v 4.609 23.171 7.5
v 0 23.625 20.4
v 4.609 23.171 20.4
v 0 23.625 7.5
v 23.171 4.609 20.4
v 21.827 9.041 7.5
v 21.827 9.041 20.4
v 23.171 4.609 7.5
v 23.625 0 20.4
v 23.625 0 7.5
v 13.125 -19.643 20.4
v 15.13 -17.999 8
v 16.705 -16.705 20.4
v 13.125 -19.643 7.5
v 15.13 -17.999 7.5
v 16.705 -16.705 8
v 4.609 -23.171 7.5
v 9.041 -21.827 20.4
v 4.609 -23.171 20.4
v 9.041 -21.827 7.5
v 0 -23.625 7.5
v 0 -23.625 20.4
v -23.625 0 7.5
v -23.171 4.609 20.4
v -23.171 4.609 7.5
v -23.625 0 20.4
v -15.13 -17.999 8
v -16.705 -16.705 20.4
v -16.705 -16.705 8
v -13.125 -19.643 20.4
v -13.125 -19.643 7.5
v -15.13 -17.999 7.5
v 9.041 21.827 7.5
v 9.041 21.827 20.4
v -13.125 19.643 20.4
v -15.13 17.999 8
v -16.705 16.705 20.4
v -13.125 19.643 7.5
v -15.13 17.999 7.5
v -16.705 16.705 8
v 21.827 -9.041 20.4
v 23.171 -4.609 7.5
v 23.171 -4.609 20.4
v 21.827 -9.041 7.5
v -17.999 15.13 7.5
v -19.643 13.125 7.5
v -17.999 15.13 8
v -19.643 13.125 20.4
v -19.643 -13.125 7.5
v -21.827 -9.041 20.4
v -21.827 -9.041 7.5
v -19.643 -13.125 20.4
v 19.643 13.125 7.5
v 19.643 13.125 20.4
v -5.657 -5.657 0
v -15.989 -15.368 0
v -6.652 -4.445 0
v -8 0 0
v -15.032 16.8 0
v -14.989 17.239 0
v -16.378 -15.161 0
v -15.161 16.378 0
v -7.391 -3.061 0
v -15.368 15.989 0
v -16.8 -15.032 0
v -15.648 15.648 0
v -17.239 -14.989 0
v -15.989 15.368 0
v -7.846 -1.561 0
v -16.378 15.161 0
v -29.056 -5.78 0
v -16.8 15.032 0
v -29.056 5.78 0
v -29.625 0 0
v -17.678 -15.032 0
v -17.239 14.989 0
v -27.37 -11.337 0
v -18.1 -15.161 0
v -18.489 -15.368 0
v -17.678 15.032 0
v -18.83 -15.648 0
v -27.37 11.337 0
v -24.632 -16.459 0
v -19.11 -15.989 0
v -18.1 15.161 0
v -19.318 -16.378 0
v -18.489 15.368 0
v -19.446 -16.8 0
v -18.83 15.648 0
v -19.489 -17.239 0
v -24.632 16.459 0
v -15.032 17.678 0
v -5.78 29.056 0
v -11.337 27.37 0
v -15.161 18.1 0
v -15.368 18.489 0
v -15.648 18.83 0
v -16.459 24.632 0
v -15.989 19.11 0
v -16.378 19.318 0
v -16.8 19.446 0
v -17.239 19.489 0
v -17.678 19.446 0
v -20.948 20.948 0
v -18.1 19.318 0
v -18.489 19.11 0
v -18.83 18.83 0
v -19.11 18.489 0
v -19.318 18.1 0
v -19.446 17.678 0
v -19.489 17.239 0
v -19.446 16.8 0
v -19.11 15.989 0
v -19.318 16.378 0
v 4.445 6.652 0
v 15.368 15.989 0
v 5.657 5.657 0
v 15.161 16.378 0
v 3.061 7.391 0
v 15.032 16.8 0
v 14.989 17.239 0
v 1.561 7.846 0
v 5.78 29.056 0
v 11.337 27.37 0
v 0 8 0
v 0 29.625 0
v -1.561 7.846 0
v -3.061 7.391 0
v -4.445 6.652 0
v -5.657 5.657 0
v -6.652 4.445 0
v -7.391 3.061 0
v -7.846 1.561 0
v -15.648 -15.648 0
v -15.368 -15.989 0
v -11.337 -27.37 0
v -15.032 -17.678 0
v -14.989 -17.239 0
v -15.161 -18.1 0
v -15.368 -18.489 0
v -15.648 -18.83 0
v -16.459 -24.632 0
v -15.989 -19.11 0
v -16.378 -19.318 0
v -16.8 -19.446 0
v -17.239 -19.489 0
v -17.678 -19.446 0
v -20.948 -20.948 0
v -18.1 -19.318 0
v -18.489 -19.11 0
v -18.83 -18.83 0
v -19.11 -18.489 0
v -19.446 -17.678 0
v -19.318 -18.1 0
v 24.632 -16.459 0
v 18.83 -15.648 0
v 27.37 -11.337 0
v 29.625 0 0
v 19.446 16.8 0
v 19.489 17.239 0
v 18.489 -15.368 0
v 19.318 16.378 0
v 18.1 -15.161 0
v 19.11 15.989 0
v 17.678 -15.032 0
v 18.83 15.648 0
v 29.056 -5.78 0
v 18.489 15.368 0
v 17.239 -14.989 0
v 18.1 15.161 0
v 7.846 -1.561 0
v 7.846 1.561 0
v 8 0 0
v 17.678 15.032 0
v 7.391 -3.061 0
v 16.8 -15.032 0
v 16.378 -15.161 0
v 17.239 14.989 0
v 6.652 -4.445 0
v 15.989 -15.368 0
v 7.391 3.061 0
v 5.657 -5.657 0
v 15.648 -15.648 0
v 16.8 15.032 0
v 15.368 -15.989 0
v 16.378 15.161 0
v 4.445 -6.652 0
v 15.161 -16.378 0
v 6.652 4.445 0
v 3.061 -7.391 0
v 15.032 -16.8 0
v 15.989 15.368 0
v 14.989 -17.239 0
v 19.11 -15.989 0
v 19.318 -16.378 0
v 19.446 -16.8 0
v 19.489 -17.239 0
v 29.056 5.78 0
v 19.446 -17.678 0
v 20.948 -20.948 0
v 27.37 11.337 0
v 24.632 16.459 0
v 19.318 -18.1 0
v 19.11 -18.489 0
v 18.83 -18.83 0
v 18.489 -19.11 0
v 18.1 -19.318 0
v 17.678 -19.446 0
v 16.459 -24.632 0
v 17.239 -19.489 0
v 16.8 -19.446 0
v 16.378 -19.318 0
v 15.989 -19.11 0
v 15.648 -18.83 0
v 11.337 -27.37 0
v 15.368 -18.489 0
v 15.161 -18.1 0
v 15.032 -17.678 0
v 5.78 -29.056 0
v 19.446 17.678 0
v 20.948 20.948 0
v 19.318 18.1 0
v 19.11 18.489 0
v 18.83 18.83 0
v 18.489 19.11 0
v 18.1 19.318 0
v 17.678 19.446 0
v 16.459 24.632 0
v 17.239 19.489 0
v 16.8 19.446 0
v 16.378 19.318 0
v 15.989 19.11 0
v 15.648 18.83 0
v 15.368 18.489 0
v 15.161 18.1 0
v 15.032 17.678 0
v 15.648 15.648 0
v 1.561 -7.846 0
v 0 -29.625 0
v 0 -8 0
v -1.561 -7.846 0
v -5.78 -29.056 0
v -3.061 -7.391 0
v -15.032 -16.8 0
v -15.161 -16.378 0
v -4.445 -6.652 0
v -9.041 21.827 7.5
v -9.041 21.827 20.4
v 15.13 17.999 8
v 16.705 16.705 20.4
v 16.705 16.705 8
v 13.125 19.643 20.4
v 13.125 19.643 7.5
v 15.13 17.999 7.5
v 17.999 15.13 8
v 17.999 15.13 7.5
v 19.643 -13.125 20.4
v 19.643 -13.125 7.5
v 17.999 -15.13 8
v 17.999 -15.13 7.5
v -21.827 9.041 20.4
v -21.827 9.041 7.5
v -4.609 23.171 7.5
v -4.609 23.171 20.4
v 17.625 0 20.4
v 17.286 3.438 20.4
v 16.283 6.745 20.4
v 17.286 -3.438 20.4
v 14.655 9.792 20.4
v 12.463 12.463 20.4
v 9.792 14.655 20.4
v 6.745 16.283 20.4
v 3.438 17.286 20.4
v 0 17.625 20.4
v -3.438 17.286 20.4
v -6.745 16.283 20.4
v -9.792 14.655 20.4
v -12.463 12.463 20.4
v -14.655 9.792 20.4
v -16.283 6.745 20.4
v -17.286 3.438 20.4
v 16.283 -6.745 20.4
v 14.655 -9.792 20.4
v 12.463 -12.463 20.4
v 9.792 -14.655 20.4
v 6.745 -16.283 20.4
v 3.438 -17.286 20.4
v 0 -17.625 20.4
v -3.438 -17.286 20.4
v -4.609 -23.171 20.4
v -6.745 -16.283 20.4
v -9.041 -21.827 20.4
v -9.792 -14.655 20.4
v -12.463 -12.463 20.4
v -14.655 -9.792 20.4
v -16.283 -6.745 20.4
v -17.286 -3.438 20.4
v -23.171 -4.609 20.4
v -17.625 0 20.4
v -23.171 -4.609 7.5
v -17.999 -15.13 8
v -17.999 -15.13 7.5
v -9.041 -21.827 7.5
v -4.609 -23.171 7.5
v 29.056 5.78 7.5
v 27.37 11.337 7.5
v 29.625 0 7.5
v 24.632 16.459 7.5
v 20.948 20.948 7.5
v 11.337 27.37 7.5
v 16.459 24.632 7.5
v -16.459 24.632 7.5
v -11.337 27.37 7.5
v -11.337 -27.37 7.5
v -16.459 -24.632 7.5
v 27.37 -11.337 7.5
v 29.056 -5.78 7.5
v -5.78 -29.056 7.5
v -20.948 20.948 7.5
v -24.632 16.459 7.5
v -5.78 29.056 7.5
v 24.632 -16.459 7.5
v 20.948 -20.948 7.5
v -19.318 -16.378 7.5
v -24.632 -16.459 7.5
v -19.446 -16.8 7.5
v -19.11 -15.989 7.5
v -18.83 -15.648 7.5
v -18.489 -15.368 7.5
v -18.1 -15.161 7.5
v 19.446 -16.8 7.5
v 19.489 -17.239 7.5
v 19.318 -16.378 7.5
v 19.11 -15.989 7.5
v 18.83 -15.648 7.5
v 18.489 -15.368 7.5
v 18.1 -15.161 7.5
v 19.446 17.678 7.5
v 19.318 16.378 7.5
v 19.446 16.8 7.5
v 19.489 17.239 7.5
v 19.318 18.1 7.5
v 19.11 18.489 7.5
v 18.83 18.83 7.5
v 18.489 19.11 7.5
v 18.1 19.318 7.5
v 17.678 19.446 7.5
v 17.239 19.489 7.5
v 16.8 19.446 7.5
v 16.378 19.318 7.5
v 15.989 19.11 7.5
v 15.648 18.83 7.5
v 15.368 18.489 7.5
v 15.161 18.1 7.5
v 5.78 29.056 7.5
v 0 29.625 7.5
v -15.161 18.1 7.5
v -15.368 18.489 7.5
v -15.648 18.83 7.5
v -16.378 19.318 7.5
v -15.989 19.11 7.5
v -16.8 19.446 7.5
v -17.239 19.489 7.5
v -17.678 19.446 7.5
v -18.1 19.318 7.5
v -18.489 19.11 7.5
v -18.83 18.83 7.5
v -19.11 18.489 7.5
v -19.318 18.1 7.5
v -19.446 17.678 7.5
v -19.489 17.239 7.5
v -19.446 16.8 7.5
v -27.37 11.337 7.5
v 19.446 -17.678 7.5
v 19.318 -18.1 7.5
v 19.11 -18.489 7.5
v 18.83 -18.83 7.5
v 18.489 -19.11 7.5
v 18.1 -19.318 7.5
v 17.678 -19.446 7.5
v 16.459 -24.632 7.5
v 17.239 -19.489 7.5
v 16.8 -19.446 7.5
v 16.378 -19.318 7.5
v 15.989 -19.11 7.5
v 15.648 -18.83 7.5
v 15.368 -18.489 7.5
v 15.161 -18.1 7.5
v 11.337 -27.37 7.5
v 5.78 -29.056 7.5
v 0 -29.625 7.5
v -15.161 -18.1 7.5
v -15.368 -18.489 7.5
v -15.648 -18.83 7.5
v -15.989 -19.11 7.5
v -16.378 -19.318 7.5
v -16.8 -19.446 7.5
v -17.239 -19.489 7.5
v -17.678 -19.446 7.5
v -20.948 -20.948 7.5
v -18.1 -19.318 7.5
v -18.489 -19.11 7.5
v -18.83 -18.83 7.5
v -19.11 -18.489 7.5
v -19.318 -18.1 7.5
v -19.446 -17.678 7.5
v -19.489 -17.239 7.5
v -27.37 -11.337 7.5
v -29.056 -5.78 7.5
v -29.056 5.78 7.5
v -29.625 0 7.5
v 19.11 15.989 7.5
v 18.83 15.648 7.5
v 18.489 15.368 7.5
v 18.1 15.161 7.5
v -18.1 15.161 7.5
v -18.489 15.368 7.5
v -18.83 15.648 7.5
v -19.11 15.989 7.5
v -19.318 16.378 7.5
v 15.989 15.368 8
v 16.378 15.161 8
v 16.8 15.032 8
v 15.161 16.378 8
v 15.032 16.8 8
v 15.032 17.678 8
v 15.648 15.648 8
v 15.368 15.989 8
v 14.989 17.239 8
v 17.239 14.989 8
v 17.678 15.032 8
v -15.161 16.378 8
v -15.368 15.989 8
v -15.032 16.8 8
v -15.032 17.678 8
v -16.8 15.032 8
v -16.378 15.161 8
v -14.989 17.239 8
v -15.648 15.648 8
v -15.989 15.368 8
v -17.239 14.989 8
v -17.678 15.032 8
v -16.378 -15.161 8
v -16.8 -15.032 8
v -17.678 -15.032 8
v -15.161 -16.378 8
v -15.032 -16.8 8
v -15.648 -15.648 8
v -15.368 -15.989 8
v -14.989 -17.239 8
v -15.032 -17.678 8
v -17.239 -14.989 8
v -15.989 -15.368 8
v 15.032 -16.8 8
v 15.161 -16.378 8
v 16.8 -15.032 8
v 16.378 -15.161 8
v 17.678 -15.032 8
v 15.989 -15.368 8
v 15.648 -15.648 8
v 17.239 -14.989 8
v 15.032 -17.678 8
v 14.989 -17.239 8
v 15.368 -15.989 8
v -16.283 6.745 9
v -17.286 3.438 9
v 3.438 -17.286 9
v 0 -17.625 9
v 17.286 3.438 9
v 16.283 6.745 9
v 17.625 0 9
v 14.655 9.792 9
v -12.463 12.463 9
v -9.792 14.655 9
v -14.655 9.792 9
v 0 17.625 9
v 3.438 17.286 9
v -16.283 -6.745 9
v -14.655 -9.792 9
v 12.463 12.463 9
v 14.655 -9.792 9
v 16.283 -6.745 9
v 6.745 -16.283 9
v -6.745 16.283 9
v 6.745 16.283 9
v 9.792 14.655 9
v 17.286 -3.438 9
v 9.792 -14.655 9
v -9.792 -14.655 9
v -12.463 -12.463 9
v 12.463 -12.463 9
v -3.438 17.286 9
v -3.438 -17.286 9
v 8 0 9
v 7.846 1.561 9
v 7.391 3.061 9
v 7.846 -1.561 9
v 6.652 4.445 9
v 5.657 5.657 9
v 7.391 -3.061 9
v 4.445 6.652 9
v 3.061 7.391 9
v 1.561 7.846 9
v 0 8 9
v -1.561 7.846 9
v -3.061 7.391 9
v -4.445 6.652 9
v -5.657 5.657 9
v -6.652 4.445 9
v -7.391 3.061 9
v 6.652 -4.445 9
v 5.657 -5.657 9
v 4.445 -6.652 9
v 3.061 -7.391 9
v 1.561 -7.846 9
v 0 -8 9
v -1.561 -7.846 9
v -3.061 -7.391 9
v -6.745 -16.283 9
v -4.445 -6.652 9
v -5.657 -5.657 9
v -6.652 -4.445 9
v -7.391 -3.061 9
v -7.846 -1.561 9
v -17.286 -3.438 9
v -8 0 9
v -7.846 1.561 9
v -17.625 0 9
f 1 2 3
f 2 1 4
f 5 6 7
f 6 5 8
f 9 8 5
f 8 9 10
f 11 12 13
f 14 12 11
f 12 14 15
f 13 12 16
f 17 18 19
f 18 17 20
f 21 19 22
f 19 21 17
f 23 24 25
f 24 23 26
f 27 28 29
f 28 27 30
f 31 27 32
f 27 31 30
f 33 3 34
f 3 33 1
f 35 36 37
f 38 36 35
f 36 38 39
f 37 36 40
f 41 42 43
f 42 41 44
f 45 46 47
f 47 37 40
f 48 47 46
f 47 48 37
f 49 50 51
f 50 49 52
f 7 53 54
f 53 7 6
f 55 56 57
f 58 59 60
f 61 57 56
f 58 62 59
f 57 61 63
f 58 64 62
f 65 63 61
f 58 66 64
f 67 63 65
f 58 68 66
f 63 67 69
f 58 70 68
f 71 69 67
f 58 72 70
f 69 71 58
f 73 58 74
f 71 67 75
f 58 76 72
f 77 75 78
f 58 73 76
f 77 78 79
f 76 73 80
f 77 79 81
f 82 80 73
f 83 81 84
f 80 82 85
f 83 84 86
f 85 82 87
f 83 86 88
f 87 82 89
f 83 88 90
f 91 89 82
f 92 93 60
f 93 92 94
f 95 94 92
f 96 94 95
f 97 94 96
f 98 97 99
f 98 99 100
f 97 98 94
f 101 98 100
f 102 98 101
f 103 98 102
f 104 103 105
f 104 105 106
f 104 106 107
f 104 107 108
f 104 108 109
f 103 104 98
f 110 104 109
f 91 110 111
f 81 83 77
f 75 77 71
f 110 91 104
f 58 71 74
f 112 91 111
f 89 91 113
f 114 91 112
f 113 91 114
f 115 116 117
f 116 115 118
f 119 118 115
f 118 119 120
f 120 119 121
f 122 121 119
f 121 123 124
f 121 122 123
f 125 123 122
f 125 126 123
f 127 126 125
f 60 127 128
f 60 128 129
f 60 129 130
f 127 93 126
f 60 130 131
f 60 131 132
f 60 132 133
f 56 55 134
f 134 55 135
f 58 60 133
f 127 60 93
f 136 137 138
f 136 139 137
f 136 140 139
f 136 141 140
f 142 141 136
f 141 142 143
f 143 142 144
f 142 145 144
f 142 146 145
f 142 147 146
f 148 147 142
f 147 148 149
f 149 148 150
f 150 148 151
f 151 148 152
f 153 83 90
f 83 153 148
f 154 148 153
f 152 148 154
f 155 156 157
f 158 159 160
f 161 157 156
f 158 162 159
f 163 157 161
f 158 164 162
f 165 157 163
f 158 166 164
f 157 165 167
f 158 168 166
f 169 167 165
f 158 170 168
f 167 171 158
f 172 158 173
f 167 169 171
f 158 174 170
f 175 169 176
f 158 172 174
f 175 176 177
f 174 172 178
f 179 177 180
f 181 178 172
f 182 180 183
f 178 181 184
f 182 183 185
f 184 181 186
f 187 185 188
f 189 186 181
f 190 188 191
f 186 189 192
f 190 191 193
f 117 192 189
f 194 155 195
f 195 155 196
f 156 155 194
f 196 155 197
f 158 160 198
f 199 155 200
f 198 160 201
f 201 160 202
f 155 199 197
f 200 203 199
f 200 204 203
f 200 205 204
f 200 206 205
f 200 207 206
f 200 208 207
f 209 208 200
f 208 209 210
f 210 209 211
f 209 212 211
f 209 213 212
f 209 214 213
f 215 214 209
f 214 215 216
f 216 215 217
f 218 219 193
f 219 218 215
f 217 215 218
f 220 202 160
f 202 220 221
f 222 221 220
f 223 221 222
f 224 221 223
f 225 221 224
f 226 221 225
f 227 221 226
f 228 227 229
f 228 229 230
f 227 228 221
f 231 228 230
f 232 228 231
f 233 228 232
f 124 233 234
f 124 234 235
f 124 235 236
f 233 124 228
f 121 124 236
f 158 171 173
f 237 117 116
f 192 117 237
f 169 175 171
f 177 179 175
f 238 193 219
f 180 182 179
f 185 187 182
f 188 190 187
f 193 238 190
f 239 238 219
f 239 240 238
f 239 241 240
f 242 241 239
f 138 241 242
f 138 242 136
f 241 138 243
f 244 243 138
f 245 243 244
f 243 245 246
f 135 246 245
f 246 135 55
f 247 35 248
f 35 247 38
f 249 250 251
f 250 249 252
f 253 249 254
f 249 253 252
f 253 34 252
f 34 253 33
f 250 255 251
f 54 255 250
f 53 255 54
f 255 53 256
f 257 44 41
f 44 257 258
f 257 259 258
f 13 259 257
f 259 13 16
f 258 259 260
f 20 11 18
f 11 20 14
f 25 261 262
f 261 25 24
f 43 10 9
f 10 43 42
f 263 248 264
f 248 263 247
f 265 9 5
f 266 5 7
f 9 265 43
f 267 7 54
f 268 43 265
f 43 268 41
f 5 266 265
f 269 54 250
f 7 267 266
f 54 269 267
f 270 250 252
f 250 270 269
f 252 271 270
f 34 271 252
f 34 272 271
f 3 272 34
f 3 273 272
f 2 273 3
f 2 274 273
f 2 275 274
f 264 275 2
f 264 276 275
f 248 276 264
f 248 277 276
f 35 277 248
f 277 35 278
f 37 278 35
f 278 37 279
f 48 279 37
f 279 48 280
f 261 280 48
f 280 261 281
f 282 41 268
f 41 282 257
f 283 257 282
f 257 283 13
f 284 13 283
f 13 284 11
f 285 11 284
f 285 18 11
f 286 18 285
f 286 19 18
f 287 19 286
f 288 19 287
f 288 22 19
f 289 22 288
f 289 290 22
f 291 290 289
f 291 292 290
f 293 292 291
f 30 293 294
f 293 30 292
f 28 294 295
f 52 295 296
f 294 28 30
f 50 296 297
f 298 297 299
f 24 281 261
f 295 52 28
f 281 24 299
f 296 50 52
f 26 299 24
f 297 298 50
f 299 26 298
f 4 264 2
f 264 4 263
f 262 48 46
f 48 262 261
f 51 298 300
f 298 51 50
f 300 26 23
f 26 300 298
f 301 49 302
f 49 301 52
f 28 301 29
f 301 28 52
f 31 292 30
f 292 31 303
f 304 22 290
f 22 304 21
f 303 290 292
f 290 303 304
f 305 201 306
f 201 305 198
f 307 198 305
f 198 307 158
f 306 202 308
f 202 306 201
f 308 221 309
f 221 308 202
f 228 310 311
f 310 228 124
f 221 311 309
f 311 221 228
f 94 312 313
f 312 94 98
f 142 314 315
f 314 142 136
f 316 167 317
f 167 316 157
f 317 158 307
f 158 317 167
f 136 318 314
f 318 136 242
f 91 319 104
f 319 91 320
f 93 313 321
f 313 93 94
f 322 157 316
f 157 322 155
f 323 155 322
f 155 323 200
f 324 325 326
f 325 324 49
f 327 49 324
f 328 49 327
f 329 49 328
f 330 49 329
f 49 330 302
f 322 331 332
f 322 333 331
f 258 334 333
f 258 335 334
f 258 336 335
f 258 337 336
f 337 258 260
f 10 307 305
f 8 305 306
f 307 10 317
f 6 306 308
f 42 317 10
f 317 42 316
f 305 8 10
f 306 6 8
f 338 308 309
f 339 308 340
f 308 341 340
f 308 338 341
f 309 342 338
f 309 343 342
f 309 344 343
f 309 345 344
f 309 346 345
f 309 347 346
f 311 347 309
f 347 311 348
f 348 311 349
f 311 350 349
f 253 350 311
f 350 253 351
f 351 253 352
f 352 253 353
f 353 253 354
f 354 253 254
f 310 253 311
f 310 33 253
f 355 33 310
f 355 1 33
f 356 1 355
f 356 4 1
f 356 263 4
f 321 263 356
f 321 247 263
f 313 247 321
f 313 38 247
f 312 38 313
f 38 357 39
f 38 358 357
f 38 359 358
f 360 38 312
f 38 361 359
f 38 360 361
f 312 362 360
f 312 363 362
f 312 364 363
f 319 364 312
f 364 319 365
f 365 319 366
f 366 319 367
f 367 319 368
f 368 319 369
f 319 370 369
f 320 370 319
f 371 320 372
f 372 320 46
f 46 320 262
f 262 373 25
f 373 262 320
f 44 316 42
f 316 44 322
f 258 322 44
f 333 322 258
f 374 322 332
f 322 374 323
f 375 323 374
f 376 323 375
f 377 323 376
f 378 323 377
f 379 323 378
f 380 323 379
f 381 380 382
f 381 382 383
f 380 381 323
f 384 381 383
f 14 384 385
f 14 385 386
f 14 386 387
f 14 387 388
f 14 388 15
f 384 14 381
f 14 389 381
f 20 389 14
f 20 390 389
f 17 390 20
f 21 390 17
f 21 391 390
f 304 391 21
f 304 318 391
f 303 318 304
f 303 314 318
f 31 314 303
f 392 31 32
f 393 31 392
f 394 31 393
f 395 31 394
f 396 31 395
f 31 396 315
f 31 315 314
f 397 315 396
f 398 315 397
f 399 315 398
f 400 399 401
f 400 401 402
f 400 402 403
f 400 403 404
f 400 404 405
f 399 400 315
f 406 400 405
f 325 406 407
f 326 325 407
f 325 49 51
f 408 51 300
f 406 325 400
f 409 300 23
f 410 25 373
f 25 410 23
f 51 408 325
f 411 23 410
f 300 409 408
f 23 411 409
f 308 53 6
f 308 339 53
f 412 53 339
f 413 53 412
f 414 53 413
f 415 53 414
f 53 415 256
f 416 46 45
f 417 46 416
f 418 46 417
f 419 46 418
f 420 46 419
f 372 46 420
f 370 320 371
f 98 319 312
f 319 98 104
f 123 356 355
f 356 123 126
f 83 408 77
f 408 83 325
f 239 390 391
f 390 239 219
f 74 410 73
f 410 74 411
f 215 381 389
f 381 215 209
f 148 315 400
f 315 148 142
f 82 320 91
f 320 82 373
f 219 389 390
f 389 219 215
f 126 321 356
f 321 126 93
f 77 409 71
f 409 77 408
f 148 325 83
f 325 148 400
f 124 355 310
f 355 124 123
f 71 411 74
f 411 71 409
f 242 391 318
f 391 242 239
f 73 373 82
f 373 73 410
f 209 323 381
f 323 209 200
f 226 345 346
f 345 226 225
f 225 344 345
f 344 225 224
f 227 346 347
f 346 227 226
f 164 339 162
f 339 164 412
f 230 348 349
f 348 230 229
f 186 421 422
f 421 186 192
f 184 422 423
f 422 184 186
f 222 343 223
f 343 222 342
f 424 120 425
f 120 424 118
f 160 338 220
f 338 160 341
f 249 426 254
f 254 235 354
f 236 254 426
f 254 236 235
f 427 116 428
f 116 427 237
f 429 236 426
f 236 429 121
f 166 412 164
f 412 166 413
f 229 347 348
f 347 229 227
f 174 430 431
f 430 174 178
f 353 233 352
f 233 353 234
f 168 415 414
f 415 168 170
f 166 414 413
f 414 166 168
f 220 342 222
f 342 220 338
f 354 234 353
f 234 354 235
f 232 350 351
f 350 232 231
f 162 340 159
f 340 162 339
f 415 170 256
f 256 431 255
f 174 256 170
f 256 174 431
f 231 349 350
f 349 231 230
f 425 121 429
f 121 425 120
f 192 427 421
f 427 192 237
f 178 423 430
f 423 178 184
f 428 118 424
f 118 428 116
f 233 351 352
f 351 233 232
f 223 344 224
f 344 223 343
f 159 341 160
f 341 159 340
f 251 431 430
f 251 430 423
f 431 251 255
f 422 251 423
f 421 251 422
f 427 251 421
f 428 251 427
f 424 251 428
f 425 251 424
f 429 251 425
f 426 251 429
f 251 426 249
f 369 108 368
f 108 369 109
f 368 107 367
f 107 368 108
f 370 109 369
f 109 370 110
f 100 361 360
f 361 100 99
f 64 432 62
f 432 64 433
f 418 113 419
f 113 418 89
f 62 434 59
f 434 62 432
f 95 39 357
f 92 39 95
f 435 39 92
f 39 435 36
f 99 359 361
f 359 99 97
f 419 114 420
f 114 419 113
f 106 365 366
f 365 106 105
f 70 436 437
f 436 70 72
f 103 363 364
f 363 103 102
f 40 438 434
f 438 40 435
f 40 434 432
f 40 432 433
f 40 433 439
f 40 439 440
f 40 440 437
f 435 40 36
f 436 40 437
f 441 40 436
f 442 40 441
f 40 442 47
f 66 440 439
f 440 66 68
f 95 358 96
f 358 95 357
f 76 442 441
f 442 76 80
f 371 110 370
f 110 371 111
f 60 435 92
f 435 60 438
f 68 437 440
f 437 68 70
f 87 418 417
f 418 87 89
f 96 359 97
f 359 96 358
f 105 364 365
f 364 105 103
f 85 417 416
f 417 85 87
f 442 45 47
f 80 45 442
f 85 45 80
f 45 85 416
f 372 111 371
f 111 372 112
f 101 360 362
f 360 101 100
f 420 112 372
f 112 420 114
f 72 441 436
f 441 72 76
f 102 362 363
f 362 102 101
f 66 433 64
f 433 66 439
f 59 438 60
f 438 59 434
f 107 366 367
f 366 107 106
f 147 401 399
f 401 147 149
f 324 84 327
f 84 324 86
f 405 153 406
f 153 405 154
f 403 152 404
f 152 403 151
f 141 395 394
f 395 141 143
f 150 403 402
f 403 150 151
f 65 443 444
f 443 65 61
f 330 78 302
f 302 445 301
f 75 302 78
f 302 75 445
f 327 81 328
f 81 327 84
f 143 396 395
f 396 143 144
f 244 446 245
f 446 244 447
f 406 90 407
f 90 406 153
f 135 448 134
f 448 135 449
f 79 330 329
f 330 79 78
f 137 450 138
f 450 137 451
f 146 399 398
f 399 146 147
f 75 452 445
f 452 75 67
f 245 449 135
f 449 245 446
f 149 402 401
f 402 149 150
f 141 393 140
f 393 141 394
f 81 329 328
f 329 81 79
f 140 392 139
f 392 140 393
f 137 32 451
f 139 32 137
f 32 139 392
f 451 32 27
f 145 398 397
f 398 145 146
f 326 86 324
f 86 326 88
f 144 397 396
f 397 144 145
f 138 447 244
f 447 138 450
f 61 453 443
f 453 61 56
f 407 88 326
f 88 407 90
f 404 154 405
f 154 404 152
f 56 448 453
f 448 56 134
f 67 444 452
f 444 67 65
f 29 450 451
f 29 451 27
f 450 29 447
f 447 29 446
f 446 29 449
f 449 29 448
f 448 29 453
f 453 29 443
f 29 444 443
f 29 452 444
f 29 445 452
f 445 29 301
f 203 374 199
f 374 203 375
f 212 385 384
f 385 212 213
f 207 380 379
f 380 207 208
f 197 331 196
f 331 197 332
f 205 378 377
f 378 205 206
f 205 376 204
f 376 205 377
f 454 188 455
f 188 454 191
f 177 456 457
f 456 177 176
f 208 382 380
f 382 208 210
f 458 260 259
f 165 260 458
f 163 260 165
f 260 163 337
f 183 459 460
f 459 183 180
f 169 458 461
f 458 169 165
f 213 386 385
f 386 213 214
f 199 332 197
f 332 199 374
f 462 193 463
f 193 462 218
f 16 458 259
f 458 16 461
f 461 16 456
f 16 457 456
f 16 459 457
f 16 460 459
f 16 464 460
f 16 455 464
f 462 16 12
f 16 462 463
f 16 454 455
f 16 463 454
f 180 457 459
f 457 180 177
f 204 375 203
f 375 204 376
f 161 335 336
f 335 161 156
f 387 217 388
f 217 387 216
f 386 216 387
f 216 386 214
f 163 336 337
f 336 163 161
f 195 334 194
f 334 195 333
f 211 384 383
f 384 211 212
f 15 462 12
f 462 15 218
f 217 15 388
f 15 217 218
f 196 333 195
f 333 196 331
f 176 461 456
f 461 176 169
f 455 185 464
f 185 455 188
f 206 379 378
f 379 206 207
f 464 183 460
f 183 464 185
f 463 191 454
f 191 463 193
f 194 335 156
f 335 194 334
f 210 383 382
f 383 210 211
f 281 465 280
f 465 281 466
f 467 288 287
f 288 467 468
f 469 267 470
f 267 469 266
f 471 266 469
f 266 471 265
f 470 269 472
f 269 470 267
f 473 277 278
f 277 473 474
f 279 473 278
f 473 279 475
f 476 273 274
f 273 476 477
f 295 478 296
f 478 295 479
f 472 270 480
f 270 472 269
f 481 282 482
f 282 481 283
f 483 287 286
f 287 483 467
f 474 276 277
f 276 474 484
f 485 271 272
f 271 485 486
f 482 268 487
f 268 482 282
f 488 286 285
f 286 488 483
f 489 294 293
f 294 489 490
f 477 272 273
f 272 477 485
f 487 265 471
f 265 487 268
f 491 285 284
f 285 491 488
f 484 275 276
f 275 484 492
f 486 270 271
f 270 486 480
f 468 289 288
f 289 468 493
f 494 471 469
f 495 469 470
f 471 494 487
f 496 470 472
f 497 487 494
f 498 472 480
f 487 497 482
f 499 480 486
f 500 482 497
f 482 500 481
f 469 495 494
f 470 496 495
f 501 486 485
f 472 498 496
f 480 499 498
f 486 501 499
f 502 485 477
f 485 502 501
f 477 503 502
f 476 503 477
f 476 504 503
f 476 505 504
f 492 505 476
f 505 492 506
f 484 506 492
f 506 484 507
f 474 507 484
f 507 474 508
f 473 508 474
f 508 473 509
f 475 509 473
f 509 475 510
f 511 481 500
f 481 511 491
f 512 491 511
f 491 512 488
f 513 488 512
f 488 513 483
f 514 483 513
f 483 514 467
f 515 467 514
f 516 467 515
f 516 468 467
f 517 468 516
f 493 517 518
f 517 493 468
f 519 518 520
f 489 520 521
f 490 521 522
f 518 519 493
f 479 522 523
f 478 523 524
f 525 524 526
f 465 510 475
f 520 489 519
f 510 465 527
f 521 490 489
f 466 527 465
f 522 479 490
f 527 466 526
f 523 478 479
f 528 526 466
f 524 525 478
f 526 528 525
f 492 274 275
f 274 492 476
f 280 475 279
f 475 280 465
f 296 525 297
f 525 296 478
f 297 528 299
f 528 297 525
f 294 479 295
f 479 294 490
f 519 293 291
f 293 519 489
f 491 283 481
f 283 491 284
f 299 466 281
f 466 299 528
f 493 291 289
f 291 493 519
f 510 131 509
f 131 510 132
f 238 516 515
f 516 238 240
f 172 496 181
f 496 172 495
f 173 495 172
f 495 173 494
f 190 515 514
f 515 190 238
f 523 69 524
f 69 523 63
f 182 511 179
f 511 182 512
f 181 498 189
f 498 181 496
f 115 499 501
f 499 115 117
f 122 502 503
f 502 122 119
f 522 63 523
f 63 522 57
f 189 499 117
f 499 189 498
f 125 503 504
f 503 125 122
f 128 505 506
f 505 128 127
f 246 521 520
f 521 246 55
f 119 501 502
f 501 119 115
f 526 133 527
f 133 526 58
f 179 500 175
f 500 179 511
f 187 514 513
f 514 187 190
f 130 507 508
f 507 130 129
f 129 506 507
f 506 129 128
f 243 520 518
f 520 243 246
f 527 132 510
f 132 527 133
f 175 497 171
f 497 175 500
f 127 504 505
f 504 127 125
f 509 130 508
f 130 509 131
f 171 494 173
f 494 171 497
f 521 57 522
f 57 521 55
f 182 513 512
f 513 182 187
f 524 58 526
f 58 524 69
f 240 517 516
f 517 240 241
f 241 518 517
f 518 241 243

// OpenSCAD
$fn = 32;

// ----------------------------------------------------------------------
// Bearing housing: seat for 6202 (35 x 11 mm), 47.25 mm body
// ----------------------------------------------------------------------

// --- parameters (mm) ---
case_d = 47.25;           // housing outside diameter
case_h = 20.4;            // overall housing height
rim_t = 6;                // wall thickness
bearing_seat = 35.25;     // 6202 seat, 0.25 mm clearance
seat_h = 11.4;            // pocket depth
shoulder = 3;             // shoulder under the bearing
pass_d = 16;              // shaft passage
ear_d = 59.25;            // mounting flange diameter
flange_t = 6;             // flange thickness
bolt_d = 4.5;             // flange bolt clearance
bolt_r = 24.38;           // flange bolt circle radius

module body() {
  cylinder(h = case_h, d = case_d);
}

module flange() {
  /* flange sunk 1.5 mm into the body */
  cylinder(h = flange_t + 1.5, d = ear_d);
}

difference() {
  union() {
    body();
    flange();
  }
  translate([0, 0, case_h - seat_h]) cylinder(h = seat_h + 1, d = bearing_seat);
  translate([0, 0, -1]) cylinder(h = case_h - seat_h + 1, d = pass_d);
  for (i = [0 : 3]) rotate([0, 0, 45 + i * 90]) translate([bolt_r, 0, -1])
    cylinder(h = flange_t + 3, d = bolt_d);
}
